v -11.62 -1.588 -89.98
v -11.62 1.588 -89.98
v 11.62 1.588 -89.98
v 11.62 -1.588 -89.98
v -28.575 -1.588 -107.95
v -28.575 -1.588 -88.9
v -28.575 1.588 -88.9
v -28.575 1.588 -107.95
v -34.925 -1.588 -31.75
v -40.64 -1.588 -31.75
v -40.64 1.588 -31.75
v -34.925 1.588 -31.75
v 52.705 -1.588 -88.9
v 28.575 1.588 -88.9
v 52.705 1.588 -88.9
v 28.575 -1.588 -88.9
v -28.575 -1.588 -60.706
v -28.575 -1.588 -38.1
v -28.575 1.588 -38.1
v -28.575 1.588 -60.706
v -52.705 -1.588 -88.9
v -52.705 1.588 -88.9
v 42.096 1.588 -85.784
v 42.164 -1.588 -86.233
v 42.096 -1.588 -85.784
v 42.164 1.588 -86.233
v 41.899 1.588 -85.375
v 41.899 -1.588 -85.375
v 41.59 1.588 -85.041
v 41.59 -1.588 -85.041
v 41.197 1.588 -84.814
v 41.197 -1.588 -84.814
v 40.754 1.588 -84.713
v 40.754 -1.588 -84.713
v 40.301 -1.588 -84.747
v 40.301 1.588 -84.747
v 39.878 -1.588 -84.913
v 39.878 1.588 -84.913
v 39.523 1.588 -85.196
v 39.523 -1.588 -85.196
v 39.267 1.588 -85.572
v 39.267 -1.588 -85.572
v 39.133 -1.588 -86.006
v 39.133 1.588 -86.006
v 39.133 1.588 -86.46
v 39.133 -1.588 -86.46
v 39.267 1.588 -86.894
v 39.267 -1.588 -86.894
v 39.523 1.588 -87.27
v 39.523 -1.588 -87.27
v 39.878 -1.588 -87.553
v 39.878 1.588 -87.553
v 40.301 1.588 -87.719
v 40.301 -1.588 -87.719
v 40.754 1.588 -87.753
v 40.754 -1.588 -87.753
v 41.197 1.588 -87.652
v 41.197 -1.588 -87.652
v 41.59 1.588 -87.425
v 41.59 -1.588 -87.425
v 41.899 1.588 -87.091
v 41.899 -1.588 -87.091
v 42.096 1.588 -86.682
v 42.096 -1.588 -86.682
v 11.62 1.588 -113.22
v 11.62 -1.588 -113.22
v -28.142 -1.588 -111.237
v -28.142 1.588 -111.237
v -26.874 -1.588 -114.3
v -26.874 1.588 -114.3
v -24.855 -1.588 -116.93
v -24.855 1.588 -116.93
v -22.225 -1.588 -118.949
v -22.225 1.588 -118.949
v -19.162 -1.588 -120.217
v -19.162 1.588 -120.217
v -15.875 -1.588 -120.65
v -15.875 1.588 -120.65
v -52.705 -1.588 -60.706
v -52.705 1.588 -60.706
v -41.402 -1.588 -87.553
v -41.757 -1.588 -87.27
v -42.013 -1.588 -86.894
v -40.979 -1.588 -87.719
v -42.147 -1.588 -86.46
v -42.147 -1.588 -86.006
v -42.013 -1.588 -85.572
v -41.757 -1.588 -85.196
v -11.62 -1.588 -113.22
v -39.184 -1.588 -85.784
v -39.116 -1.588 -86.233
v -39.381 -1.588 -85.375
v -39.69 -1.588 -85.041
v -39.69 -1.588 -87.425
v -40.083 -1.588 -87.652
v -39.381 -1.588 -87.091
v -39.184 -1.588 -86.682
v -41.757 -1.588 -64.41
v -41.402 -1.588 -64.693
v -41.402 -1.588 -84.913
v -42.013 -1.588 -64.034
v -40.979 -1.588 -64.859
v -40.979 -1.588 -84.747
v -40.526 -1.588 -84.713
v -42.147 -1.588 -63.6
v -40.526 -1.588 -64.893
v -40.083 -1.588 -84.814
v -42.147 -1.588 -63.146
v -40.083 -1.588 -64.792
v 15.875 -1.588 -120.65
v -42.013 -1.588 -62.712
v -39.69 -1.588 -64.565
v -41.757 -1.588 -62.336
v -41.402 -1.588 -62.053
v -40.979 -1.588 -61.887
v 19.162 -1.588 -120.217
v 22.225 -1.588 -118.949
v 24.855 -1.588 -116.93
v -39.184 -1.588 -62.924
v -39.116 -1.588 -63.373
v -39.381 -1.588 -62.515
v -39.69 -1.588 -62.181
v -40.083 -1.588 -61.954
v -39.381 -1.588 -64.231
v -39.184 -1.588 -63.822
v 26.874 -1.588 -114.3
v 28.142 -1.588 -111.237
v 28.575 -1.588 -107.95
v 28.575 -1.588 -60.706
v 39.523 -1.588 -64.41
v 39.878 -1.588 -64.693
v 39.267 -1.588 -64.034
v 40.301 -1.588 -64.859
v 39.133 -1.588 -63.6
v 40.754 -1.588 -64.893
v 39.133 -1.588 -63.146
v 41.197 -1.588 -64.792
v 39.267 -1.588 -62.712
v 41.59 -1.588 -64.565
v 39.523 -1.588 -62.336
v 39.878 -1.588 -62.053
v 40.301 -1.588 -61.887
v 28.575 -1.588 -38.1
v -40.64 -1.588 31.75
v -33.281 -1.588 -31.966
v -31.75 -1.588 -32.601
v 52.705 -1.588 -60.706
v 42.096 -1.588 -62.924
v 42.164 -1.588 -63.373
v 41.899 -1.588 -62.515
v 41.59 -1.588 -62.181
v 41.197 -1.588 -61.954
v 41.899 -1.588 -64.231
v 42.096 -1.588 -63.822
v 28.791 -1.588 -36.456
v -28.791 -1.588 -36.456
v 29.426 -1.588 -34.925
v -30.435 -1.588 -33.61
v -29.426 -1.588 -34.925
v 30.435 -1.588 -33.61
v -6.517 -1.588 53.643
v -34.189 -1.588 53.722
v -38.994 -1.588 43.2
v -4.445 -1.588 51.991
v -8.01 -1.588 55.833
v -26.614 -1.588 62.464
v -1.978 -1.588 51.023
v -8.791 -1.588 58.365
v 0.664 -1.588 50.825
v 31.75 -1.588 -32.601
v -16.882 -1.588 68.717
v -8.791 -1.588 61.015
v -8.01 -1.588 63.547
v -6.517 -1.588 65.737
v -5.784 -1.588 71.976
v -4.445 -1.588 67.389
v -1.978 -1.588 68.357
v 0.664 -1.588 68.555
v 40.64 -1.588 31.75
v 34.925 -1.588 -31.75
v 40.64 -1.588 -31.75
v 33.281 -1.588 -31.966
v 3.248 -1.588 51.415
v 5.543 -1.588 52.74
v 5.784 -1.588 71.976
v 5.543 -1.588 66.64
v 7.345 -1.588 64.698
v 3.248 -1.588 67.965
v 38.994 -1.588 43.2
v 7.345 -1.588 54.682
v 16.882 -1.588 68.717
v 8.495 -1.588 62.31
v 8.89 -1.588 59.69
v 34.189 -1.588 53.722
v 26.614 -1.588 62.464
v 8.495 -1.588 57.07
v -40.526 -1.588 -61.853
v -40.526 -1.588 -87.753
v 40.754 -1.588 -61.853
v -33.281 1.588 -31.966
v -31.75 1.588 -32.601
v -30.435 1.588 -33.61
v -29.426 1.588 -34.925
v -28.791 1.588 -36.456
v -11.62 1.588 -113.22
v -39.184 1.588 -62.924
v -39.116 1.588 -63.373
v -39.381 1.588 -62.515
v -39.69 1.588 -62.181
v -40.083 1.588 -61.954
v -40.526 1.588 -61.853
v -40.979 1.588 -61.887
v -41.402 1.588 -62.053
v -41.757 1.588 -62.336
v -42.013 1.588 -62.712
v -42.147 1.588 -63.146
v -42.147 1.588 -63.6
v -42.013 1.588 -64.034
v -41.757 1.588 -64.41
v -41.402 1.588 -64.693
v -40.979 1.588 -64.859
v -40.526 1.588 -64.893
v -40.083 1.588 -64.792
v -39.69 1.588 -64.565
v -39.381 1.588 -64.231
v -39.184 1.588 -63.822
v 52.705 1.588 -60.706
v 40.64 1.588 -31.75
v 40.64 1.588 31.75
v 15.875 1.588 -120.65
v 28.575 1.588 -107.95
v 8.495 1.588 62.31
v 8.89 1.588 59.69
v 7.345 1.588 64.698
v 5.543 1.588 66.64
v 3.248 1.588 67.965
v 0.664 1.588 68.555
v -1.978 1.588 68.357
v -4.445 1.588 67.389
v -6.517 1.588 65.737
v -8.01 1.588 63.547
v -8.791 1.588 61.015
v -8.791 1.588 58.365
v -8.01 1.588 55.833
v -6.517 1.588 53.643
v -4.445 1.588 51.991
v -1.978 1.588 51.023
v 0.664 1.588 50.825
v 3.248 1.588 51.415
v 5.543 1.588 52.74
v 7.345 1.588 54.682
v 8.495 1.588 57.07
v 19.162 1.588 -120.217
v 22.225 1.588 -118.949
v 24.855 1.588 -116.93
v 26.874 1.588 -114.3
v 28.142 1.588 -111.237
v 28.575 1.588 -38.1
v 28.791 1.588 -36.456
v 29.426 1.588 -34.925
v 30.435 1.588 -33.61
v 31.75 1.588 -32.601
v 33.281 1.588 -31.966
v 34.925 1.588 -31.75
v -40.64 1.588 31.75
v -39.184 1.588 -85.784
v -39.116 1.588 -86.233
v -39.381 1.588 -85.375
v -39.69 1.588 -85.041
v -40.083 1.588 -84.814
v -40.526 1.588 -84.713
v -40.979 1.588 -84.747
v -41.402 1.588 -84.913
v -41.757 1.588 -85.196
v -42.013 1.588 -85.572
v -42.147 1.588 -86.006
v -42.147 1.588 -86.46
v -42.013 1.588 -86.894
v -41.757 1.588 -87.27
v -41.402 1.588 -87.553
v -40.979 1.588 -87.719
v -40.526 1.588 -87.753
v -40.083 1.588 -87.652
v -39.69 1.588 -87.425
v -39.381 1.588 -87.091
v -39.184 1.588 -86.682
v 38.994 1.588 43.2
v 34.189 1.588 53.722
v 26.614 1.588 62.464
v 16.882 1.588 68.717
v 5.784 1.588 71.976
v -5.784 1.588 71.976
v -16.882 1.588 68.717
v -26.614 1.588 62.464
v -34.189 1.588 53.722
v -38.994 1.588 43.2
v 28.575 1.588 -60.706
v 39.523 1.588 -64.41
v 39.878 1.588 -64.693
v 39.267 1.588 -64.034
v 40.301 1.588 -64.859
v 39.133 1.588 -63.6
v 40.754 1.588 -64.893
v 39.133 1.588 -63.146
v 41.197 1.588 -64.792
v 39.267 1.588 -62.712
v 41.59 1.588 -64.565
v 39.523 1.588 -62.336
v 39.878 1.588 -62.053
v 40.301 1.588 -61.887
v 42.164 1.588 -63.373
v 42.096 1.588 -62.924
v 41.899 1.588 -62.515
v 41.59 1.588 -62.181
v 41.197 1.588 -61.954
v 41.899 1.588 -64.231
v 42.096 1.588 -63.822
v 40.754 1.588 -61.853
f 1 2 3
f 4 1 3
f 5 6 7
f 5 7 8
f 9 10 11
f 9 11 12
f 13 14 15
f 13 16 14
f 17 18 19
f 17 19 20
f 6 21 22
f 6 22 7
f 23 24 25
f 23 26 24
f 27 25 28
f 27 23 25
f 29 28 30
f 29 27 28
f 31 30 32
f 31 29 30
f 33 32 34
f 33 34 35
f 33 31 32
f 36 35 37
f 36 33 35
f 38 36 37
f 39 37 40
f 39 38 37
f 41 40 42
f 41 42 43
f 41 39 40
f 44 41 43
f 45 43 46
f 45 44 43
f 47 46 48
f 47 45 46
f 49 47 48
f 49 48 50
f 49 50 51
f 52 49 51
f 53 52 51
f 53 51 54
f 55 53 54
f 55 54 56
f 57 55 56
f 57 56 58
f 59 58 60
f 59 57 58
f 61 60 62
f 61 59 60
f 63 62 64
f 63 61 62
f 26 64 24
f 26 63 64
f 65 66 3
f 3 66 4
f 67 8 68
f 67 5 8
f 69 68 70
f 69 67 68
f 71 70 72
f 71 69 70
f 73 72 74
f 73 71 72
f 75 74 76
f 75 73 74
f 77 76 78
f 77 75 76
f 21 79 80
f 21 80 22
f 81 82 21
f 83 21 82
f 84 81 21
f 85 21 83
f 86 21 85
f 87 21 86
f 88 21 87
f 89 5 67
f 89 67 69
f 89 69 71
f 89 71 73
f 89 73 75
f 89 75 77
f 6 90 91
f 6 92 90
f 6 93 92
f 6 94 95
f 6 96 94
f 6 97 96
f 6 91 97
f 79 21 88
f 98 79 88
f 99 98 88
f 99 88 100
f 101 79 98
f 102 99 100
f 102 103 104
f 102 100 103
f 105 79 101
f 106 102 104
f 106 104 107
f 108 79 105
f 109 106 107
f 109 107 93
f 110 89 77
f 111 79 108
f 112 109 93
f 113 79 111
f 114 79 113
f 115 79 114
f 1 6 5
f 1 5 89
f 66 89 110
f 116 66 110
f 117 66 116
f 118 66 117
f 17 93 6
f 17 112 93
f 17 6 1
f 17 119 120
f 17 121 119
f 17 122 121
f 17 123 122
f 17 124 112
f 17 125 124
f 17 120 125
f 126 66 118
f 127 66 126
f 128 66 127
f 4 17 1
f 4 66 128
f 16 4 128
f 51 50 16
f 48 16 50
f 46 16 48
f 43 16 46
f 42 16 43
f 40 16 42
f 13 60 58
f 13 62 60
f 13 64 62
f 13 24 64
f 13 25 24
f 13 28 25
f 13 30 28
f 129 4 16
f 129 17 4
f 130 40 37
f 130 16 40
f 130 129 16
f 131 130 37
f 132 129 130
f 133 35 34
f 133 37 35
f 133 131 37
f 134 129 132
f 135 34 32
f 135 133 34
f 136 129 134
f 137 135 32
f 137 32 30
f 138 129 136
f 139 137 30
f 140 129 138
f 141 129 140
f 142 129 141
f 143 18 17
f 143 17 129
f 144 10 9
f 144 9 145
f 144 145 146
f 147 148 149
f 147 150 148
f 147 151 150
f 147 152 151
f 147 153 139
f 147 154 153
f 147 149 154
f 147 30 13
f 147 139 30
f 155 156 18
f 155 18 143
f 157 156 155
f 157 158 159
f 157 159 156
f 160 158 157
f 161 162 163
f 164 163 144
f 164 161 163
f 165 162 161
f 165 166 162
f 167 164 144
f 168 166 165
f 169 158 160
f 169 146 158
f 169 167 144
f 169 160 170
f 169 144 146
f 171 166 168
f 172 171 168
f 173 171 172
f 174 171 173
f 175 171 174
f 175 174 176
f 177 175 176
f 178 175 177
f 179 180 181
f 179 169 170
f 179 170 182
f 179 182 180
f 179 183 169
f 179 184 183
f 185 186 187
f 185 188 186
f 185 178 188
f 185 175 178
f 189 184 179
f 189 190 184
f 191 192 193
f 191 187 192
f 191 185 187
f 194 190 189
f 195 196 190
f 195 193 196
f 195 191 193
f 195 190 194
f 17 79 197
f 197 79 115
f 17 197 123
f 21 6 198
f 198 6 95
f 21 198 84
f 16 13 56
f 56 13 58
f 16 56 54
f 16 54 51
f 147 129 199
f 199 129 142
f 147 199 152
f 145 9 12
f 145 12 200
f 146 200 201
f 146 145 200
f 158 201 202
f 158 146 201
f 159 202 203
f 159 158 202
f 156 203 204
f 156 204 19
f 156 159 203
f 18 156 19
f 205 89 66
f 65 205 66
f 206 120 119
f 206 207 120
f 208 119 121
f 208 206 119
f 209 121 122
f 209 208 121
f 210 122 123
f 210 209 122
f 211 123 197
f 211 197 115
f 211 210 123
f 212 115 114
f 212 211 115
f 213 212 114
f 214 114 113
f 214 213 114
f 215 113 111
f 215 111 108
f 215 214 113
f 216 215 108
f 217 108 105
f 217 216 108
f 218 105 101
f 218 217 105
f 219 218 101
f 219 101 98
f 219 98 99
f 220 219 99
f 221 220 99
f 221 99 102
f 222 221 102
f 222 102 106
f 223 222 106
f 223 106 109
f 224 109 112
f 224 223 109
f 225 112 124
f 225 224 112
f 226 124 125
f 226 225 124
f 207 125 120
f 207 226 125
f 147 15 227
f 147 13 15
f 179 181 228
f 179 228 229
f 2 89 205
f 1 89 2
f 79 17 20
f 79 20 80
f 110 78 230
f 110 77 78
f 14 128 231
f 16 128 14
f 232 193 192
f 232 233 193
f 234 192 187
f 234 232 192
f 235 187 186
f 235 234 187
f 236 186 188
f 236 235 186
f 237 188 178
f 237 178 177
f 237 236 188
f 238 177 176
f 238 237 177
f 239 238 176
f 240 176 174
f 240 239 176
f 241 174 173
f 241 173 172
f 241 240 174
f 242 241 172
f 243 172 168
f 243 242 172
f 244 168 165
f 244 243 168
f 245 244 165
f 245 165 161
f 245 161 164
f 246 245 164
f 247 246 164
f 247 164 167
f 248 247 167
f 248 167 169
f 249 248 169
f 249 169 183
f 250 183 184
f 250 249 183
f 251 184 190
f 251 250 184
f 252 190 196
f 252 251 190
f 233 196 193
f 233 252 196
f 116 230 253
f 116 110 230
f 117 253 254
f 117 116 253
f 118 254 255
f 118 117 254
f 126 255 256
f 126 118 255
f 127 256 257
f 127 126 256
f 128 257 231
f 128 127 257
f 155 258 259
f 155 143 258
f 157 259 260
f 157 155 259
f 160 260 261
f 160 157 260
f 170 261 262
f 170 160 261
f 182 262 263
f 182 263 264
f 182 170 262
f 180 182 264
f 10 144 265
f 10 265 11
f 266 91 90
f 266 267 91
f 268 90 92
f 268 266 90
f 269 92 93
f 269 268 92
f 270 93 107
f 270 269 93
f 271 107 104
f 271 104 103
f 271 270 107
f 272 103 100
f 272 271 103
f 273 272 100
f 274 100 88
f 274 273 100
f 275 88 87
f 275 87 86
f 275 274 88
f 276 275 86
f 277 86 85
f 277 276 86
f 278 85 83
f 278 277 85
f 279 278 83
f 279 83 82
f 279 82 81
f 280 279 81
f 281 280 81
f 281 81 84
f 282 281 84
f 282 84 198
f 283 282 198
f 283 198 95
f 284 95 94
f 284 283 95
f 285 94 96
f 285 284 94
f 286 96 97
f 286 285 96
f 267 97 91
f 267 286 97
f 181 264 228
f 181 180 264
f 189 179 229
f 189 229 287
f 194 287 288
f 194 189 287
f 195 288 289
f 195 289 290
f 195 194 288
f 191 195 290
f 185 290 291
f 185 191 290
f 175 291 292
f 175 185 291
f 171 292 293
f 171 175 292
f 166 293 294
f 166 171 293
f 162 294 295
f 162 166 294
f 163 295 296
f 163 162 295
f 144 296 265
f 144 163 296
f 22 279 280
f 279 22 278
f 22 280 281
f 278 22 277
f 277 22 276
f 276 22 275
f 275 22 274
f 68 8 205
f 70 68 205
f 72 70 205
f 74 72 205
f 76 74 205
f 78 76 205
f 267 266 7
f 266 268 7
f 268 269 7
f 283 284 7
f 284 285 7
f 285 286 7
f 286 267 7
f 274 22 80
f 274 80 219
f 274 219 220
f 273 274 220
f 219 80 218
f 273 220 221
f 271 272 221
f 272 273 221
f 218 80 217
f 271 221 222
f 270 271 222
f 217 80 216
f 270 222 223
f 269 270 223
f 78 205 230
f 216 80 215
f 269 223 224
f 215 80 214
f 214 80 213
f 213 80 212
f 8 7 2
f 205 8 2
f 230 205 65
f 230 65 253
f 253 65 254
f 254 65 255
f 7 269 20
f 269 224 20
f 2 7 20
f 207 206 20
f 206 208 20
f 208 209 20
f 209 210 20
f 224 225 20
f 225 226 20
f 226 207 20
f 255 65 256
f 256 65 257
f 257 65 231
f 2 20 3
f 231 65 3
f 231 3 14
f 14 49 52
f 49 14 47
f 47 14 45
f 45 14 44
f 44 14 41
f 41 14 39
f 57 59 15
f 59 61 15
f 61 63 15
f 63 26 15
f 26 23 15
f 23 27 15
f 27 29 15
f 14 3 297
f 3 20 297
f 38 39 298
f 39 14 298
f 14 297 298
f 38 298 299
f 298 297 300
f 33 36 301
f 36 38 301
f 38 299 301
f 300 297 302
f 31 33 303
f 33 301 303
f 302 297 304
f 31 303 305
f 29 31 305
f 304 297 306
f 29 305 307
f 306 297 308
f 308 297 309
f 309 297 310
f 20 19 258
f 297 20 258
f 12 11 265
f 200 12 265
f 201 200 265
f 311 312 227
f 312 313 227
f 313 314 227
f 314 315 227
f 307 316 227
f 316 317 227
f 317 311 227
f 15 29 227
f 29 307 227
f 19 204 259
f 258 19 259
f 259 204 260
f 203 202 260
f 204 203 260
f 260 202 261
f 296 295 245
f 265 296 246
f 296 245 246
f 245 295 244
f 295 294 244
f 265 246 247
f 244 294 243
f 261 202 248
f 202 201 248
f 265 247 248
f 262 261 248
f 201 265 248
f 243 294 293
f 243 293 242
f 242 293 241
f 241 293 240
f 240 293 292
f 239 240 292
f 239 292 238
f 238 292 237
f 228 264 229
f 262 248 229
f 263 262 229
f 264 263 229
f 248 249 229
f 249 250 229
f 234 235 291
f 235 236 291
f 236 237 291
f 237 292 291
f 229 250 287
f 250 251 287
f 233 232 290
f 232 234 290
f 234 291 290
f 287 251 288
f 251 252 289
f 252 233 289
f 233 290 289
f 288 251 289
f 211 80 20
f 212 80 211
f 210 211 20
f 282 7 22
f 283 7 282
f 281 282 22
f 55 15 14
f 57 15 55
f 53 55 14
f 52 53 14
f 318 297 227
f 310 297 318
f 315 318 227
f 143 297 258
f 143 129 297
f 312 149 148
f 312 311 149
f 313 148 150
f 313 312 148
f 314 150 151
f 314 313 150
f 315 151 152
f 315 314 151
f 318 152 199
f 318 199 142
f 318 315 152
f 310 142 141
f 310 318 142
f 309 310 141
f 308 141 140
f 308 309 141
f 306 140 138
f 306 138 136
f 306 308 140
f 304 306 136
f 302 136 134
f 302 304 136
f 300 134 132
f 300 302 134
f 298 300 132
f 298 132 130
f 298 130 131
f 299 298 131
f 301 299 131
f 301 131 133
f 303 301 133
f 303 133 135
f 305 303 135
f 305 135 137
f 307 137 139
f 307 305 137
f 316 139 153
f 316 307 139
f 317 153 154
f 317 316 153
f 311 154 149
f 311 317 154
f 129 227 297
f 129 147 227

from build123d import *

# Parameters (mm, degrees)
F0_R     = 1.524
F0_W     = 23.241
F0_H     = 23.241
F0_R_2   = 8.89
F1_DEPTH = 1.5875


# Not quite as in the source:
# - a length typed as a fraction of an inch, garbled in the dataset ("3 / 203.2 mm" for 3/8 in), is restored


with BuildPart() as f1:
    # F0 (on Front) → F1 (new body, symmetric)
    with BuildSketch(Plane.XZ):
        with BuildLine():
            Line((34.925, -31.75), (40.6399987437, -31.75))
            Line((40.6399987437, -31.75), (40.6400012563, 31.75))
            ThreePointArc((40.6400012563, 31.75), (1.2563e-06, 72.3900018664), (-40.6399987437, 31.75))
            Line((-40.6399987437, 31.75), (-40.6400012563, -31.75))
            Line((-40.6400012563, -31.75), (-34.925, -31.75))
            ThreePointArc((-34.925, -31.75), (-30.4348719395, -33.6098719395), (-28.575, -38.1))
            Line((-28.575, -38.1), (-28.575, -60.706))
            Line((-28.575, -60.706), (-52.705, -60.706))
            Line((-52.705, -60.706), (-52.705, -88.9))
            Line((-52.705, -88.9), (-28.575, -88.9))
            Line((-28.575, -88.9), (-28.575, -107.95))
            ThreePointArc((-28.575, -107.95), (-24.8552561211, -116.9302561211), (-15.875, -120.65))
            Line((-15.875, -120.65), (15.875, -120.65))
            ThreePointArc((15.875, -120.65), (24.8552561211, -116.9302561211), (28.575, -107.95))
            Line((28.575, -107.95), (28.575, -88.9))
            Line((28.575, -88.9), (52.705, -88.9))
            Line((52.705, -88.9), (52.705, -60.706))
            Line((52.705, -60.706), (28.575, -60.706))
            Line((28.575, -60.706), (28.575, -38.1))
            ThreePointArc((28.575, -38.1), (30.4348719395, -33.6098719395), (34.925, -31.75))
        make_face()
        with Locations((-40.64, -86.233)):
            Circle(F0_R, mode=Mode.SUBTRACT)
        with Locations((-40.64, -63.373)):
            Circle(F0_R, mode=Mode.SUBTRACT)
        with Locations((0, -101.6)):
            Rectangle(F0_W, F0_H, mode=Mode.SUBTRACT)
        with Locations((40.64, -86.233)):
            Circle(F0_R, mode=Mode.SUBTRACT)
        with Locations((40.64, -63.373)):
            Circle(F0_R, mode=Mode.SUBTRACT)
        with Locations((0, 59.6900018664)):
            Circle(F0_R_2, mode=Mode.SUBTRACT)
    extrude(amount=F1_DEPTH, both=True)


solid = f1.part
